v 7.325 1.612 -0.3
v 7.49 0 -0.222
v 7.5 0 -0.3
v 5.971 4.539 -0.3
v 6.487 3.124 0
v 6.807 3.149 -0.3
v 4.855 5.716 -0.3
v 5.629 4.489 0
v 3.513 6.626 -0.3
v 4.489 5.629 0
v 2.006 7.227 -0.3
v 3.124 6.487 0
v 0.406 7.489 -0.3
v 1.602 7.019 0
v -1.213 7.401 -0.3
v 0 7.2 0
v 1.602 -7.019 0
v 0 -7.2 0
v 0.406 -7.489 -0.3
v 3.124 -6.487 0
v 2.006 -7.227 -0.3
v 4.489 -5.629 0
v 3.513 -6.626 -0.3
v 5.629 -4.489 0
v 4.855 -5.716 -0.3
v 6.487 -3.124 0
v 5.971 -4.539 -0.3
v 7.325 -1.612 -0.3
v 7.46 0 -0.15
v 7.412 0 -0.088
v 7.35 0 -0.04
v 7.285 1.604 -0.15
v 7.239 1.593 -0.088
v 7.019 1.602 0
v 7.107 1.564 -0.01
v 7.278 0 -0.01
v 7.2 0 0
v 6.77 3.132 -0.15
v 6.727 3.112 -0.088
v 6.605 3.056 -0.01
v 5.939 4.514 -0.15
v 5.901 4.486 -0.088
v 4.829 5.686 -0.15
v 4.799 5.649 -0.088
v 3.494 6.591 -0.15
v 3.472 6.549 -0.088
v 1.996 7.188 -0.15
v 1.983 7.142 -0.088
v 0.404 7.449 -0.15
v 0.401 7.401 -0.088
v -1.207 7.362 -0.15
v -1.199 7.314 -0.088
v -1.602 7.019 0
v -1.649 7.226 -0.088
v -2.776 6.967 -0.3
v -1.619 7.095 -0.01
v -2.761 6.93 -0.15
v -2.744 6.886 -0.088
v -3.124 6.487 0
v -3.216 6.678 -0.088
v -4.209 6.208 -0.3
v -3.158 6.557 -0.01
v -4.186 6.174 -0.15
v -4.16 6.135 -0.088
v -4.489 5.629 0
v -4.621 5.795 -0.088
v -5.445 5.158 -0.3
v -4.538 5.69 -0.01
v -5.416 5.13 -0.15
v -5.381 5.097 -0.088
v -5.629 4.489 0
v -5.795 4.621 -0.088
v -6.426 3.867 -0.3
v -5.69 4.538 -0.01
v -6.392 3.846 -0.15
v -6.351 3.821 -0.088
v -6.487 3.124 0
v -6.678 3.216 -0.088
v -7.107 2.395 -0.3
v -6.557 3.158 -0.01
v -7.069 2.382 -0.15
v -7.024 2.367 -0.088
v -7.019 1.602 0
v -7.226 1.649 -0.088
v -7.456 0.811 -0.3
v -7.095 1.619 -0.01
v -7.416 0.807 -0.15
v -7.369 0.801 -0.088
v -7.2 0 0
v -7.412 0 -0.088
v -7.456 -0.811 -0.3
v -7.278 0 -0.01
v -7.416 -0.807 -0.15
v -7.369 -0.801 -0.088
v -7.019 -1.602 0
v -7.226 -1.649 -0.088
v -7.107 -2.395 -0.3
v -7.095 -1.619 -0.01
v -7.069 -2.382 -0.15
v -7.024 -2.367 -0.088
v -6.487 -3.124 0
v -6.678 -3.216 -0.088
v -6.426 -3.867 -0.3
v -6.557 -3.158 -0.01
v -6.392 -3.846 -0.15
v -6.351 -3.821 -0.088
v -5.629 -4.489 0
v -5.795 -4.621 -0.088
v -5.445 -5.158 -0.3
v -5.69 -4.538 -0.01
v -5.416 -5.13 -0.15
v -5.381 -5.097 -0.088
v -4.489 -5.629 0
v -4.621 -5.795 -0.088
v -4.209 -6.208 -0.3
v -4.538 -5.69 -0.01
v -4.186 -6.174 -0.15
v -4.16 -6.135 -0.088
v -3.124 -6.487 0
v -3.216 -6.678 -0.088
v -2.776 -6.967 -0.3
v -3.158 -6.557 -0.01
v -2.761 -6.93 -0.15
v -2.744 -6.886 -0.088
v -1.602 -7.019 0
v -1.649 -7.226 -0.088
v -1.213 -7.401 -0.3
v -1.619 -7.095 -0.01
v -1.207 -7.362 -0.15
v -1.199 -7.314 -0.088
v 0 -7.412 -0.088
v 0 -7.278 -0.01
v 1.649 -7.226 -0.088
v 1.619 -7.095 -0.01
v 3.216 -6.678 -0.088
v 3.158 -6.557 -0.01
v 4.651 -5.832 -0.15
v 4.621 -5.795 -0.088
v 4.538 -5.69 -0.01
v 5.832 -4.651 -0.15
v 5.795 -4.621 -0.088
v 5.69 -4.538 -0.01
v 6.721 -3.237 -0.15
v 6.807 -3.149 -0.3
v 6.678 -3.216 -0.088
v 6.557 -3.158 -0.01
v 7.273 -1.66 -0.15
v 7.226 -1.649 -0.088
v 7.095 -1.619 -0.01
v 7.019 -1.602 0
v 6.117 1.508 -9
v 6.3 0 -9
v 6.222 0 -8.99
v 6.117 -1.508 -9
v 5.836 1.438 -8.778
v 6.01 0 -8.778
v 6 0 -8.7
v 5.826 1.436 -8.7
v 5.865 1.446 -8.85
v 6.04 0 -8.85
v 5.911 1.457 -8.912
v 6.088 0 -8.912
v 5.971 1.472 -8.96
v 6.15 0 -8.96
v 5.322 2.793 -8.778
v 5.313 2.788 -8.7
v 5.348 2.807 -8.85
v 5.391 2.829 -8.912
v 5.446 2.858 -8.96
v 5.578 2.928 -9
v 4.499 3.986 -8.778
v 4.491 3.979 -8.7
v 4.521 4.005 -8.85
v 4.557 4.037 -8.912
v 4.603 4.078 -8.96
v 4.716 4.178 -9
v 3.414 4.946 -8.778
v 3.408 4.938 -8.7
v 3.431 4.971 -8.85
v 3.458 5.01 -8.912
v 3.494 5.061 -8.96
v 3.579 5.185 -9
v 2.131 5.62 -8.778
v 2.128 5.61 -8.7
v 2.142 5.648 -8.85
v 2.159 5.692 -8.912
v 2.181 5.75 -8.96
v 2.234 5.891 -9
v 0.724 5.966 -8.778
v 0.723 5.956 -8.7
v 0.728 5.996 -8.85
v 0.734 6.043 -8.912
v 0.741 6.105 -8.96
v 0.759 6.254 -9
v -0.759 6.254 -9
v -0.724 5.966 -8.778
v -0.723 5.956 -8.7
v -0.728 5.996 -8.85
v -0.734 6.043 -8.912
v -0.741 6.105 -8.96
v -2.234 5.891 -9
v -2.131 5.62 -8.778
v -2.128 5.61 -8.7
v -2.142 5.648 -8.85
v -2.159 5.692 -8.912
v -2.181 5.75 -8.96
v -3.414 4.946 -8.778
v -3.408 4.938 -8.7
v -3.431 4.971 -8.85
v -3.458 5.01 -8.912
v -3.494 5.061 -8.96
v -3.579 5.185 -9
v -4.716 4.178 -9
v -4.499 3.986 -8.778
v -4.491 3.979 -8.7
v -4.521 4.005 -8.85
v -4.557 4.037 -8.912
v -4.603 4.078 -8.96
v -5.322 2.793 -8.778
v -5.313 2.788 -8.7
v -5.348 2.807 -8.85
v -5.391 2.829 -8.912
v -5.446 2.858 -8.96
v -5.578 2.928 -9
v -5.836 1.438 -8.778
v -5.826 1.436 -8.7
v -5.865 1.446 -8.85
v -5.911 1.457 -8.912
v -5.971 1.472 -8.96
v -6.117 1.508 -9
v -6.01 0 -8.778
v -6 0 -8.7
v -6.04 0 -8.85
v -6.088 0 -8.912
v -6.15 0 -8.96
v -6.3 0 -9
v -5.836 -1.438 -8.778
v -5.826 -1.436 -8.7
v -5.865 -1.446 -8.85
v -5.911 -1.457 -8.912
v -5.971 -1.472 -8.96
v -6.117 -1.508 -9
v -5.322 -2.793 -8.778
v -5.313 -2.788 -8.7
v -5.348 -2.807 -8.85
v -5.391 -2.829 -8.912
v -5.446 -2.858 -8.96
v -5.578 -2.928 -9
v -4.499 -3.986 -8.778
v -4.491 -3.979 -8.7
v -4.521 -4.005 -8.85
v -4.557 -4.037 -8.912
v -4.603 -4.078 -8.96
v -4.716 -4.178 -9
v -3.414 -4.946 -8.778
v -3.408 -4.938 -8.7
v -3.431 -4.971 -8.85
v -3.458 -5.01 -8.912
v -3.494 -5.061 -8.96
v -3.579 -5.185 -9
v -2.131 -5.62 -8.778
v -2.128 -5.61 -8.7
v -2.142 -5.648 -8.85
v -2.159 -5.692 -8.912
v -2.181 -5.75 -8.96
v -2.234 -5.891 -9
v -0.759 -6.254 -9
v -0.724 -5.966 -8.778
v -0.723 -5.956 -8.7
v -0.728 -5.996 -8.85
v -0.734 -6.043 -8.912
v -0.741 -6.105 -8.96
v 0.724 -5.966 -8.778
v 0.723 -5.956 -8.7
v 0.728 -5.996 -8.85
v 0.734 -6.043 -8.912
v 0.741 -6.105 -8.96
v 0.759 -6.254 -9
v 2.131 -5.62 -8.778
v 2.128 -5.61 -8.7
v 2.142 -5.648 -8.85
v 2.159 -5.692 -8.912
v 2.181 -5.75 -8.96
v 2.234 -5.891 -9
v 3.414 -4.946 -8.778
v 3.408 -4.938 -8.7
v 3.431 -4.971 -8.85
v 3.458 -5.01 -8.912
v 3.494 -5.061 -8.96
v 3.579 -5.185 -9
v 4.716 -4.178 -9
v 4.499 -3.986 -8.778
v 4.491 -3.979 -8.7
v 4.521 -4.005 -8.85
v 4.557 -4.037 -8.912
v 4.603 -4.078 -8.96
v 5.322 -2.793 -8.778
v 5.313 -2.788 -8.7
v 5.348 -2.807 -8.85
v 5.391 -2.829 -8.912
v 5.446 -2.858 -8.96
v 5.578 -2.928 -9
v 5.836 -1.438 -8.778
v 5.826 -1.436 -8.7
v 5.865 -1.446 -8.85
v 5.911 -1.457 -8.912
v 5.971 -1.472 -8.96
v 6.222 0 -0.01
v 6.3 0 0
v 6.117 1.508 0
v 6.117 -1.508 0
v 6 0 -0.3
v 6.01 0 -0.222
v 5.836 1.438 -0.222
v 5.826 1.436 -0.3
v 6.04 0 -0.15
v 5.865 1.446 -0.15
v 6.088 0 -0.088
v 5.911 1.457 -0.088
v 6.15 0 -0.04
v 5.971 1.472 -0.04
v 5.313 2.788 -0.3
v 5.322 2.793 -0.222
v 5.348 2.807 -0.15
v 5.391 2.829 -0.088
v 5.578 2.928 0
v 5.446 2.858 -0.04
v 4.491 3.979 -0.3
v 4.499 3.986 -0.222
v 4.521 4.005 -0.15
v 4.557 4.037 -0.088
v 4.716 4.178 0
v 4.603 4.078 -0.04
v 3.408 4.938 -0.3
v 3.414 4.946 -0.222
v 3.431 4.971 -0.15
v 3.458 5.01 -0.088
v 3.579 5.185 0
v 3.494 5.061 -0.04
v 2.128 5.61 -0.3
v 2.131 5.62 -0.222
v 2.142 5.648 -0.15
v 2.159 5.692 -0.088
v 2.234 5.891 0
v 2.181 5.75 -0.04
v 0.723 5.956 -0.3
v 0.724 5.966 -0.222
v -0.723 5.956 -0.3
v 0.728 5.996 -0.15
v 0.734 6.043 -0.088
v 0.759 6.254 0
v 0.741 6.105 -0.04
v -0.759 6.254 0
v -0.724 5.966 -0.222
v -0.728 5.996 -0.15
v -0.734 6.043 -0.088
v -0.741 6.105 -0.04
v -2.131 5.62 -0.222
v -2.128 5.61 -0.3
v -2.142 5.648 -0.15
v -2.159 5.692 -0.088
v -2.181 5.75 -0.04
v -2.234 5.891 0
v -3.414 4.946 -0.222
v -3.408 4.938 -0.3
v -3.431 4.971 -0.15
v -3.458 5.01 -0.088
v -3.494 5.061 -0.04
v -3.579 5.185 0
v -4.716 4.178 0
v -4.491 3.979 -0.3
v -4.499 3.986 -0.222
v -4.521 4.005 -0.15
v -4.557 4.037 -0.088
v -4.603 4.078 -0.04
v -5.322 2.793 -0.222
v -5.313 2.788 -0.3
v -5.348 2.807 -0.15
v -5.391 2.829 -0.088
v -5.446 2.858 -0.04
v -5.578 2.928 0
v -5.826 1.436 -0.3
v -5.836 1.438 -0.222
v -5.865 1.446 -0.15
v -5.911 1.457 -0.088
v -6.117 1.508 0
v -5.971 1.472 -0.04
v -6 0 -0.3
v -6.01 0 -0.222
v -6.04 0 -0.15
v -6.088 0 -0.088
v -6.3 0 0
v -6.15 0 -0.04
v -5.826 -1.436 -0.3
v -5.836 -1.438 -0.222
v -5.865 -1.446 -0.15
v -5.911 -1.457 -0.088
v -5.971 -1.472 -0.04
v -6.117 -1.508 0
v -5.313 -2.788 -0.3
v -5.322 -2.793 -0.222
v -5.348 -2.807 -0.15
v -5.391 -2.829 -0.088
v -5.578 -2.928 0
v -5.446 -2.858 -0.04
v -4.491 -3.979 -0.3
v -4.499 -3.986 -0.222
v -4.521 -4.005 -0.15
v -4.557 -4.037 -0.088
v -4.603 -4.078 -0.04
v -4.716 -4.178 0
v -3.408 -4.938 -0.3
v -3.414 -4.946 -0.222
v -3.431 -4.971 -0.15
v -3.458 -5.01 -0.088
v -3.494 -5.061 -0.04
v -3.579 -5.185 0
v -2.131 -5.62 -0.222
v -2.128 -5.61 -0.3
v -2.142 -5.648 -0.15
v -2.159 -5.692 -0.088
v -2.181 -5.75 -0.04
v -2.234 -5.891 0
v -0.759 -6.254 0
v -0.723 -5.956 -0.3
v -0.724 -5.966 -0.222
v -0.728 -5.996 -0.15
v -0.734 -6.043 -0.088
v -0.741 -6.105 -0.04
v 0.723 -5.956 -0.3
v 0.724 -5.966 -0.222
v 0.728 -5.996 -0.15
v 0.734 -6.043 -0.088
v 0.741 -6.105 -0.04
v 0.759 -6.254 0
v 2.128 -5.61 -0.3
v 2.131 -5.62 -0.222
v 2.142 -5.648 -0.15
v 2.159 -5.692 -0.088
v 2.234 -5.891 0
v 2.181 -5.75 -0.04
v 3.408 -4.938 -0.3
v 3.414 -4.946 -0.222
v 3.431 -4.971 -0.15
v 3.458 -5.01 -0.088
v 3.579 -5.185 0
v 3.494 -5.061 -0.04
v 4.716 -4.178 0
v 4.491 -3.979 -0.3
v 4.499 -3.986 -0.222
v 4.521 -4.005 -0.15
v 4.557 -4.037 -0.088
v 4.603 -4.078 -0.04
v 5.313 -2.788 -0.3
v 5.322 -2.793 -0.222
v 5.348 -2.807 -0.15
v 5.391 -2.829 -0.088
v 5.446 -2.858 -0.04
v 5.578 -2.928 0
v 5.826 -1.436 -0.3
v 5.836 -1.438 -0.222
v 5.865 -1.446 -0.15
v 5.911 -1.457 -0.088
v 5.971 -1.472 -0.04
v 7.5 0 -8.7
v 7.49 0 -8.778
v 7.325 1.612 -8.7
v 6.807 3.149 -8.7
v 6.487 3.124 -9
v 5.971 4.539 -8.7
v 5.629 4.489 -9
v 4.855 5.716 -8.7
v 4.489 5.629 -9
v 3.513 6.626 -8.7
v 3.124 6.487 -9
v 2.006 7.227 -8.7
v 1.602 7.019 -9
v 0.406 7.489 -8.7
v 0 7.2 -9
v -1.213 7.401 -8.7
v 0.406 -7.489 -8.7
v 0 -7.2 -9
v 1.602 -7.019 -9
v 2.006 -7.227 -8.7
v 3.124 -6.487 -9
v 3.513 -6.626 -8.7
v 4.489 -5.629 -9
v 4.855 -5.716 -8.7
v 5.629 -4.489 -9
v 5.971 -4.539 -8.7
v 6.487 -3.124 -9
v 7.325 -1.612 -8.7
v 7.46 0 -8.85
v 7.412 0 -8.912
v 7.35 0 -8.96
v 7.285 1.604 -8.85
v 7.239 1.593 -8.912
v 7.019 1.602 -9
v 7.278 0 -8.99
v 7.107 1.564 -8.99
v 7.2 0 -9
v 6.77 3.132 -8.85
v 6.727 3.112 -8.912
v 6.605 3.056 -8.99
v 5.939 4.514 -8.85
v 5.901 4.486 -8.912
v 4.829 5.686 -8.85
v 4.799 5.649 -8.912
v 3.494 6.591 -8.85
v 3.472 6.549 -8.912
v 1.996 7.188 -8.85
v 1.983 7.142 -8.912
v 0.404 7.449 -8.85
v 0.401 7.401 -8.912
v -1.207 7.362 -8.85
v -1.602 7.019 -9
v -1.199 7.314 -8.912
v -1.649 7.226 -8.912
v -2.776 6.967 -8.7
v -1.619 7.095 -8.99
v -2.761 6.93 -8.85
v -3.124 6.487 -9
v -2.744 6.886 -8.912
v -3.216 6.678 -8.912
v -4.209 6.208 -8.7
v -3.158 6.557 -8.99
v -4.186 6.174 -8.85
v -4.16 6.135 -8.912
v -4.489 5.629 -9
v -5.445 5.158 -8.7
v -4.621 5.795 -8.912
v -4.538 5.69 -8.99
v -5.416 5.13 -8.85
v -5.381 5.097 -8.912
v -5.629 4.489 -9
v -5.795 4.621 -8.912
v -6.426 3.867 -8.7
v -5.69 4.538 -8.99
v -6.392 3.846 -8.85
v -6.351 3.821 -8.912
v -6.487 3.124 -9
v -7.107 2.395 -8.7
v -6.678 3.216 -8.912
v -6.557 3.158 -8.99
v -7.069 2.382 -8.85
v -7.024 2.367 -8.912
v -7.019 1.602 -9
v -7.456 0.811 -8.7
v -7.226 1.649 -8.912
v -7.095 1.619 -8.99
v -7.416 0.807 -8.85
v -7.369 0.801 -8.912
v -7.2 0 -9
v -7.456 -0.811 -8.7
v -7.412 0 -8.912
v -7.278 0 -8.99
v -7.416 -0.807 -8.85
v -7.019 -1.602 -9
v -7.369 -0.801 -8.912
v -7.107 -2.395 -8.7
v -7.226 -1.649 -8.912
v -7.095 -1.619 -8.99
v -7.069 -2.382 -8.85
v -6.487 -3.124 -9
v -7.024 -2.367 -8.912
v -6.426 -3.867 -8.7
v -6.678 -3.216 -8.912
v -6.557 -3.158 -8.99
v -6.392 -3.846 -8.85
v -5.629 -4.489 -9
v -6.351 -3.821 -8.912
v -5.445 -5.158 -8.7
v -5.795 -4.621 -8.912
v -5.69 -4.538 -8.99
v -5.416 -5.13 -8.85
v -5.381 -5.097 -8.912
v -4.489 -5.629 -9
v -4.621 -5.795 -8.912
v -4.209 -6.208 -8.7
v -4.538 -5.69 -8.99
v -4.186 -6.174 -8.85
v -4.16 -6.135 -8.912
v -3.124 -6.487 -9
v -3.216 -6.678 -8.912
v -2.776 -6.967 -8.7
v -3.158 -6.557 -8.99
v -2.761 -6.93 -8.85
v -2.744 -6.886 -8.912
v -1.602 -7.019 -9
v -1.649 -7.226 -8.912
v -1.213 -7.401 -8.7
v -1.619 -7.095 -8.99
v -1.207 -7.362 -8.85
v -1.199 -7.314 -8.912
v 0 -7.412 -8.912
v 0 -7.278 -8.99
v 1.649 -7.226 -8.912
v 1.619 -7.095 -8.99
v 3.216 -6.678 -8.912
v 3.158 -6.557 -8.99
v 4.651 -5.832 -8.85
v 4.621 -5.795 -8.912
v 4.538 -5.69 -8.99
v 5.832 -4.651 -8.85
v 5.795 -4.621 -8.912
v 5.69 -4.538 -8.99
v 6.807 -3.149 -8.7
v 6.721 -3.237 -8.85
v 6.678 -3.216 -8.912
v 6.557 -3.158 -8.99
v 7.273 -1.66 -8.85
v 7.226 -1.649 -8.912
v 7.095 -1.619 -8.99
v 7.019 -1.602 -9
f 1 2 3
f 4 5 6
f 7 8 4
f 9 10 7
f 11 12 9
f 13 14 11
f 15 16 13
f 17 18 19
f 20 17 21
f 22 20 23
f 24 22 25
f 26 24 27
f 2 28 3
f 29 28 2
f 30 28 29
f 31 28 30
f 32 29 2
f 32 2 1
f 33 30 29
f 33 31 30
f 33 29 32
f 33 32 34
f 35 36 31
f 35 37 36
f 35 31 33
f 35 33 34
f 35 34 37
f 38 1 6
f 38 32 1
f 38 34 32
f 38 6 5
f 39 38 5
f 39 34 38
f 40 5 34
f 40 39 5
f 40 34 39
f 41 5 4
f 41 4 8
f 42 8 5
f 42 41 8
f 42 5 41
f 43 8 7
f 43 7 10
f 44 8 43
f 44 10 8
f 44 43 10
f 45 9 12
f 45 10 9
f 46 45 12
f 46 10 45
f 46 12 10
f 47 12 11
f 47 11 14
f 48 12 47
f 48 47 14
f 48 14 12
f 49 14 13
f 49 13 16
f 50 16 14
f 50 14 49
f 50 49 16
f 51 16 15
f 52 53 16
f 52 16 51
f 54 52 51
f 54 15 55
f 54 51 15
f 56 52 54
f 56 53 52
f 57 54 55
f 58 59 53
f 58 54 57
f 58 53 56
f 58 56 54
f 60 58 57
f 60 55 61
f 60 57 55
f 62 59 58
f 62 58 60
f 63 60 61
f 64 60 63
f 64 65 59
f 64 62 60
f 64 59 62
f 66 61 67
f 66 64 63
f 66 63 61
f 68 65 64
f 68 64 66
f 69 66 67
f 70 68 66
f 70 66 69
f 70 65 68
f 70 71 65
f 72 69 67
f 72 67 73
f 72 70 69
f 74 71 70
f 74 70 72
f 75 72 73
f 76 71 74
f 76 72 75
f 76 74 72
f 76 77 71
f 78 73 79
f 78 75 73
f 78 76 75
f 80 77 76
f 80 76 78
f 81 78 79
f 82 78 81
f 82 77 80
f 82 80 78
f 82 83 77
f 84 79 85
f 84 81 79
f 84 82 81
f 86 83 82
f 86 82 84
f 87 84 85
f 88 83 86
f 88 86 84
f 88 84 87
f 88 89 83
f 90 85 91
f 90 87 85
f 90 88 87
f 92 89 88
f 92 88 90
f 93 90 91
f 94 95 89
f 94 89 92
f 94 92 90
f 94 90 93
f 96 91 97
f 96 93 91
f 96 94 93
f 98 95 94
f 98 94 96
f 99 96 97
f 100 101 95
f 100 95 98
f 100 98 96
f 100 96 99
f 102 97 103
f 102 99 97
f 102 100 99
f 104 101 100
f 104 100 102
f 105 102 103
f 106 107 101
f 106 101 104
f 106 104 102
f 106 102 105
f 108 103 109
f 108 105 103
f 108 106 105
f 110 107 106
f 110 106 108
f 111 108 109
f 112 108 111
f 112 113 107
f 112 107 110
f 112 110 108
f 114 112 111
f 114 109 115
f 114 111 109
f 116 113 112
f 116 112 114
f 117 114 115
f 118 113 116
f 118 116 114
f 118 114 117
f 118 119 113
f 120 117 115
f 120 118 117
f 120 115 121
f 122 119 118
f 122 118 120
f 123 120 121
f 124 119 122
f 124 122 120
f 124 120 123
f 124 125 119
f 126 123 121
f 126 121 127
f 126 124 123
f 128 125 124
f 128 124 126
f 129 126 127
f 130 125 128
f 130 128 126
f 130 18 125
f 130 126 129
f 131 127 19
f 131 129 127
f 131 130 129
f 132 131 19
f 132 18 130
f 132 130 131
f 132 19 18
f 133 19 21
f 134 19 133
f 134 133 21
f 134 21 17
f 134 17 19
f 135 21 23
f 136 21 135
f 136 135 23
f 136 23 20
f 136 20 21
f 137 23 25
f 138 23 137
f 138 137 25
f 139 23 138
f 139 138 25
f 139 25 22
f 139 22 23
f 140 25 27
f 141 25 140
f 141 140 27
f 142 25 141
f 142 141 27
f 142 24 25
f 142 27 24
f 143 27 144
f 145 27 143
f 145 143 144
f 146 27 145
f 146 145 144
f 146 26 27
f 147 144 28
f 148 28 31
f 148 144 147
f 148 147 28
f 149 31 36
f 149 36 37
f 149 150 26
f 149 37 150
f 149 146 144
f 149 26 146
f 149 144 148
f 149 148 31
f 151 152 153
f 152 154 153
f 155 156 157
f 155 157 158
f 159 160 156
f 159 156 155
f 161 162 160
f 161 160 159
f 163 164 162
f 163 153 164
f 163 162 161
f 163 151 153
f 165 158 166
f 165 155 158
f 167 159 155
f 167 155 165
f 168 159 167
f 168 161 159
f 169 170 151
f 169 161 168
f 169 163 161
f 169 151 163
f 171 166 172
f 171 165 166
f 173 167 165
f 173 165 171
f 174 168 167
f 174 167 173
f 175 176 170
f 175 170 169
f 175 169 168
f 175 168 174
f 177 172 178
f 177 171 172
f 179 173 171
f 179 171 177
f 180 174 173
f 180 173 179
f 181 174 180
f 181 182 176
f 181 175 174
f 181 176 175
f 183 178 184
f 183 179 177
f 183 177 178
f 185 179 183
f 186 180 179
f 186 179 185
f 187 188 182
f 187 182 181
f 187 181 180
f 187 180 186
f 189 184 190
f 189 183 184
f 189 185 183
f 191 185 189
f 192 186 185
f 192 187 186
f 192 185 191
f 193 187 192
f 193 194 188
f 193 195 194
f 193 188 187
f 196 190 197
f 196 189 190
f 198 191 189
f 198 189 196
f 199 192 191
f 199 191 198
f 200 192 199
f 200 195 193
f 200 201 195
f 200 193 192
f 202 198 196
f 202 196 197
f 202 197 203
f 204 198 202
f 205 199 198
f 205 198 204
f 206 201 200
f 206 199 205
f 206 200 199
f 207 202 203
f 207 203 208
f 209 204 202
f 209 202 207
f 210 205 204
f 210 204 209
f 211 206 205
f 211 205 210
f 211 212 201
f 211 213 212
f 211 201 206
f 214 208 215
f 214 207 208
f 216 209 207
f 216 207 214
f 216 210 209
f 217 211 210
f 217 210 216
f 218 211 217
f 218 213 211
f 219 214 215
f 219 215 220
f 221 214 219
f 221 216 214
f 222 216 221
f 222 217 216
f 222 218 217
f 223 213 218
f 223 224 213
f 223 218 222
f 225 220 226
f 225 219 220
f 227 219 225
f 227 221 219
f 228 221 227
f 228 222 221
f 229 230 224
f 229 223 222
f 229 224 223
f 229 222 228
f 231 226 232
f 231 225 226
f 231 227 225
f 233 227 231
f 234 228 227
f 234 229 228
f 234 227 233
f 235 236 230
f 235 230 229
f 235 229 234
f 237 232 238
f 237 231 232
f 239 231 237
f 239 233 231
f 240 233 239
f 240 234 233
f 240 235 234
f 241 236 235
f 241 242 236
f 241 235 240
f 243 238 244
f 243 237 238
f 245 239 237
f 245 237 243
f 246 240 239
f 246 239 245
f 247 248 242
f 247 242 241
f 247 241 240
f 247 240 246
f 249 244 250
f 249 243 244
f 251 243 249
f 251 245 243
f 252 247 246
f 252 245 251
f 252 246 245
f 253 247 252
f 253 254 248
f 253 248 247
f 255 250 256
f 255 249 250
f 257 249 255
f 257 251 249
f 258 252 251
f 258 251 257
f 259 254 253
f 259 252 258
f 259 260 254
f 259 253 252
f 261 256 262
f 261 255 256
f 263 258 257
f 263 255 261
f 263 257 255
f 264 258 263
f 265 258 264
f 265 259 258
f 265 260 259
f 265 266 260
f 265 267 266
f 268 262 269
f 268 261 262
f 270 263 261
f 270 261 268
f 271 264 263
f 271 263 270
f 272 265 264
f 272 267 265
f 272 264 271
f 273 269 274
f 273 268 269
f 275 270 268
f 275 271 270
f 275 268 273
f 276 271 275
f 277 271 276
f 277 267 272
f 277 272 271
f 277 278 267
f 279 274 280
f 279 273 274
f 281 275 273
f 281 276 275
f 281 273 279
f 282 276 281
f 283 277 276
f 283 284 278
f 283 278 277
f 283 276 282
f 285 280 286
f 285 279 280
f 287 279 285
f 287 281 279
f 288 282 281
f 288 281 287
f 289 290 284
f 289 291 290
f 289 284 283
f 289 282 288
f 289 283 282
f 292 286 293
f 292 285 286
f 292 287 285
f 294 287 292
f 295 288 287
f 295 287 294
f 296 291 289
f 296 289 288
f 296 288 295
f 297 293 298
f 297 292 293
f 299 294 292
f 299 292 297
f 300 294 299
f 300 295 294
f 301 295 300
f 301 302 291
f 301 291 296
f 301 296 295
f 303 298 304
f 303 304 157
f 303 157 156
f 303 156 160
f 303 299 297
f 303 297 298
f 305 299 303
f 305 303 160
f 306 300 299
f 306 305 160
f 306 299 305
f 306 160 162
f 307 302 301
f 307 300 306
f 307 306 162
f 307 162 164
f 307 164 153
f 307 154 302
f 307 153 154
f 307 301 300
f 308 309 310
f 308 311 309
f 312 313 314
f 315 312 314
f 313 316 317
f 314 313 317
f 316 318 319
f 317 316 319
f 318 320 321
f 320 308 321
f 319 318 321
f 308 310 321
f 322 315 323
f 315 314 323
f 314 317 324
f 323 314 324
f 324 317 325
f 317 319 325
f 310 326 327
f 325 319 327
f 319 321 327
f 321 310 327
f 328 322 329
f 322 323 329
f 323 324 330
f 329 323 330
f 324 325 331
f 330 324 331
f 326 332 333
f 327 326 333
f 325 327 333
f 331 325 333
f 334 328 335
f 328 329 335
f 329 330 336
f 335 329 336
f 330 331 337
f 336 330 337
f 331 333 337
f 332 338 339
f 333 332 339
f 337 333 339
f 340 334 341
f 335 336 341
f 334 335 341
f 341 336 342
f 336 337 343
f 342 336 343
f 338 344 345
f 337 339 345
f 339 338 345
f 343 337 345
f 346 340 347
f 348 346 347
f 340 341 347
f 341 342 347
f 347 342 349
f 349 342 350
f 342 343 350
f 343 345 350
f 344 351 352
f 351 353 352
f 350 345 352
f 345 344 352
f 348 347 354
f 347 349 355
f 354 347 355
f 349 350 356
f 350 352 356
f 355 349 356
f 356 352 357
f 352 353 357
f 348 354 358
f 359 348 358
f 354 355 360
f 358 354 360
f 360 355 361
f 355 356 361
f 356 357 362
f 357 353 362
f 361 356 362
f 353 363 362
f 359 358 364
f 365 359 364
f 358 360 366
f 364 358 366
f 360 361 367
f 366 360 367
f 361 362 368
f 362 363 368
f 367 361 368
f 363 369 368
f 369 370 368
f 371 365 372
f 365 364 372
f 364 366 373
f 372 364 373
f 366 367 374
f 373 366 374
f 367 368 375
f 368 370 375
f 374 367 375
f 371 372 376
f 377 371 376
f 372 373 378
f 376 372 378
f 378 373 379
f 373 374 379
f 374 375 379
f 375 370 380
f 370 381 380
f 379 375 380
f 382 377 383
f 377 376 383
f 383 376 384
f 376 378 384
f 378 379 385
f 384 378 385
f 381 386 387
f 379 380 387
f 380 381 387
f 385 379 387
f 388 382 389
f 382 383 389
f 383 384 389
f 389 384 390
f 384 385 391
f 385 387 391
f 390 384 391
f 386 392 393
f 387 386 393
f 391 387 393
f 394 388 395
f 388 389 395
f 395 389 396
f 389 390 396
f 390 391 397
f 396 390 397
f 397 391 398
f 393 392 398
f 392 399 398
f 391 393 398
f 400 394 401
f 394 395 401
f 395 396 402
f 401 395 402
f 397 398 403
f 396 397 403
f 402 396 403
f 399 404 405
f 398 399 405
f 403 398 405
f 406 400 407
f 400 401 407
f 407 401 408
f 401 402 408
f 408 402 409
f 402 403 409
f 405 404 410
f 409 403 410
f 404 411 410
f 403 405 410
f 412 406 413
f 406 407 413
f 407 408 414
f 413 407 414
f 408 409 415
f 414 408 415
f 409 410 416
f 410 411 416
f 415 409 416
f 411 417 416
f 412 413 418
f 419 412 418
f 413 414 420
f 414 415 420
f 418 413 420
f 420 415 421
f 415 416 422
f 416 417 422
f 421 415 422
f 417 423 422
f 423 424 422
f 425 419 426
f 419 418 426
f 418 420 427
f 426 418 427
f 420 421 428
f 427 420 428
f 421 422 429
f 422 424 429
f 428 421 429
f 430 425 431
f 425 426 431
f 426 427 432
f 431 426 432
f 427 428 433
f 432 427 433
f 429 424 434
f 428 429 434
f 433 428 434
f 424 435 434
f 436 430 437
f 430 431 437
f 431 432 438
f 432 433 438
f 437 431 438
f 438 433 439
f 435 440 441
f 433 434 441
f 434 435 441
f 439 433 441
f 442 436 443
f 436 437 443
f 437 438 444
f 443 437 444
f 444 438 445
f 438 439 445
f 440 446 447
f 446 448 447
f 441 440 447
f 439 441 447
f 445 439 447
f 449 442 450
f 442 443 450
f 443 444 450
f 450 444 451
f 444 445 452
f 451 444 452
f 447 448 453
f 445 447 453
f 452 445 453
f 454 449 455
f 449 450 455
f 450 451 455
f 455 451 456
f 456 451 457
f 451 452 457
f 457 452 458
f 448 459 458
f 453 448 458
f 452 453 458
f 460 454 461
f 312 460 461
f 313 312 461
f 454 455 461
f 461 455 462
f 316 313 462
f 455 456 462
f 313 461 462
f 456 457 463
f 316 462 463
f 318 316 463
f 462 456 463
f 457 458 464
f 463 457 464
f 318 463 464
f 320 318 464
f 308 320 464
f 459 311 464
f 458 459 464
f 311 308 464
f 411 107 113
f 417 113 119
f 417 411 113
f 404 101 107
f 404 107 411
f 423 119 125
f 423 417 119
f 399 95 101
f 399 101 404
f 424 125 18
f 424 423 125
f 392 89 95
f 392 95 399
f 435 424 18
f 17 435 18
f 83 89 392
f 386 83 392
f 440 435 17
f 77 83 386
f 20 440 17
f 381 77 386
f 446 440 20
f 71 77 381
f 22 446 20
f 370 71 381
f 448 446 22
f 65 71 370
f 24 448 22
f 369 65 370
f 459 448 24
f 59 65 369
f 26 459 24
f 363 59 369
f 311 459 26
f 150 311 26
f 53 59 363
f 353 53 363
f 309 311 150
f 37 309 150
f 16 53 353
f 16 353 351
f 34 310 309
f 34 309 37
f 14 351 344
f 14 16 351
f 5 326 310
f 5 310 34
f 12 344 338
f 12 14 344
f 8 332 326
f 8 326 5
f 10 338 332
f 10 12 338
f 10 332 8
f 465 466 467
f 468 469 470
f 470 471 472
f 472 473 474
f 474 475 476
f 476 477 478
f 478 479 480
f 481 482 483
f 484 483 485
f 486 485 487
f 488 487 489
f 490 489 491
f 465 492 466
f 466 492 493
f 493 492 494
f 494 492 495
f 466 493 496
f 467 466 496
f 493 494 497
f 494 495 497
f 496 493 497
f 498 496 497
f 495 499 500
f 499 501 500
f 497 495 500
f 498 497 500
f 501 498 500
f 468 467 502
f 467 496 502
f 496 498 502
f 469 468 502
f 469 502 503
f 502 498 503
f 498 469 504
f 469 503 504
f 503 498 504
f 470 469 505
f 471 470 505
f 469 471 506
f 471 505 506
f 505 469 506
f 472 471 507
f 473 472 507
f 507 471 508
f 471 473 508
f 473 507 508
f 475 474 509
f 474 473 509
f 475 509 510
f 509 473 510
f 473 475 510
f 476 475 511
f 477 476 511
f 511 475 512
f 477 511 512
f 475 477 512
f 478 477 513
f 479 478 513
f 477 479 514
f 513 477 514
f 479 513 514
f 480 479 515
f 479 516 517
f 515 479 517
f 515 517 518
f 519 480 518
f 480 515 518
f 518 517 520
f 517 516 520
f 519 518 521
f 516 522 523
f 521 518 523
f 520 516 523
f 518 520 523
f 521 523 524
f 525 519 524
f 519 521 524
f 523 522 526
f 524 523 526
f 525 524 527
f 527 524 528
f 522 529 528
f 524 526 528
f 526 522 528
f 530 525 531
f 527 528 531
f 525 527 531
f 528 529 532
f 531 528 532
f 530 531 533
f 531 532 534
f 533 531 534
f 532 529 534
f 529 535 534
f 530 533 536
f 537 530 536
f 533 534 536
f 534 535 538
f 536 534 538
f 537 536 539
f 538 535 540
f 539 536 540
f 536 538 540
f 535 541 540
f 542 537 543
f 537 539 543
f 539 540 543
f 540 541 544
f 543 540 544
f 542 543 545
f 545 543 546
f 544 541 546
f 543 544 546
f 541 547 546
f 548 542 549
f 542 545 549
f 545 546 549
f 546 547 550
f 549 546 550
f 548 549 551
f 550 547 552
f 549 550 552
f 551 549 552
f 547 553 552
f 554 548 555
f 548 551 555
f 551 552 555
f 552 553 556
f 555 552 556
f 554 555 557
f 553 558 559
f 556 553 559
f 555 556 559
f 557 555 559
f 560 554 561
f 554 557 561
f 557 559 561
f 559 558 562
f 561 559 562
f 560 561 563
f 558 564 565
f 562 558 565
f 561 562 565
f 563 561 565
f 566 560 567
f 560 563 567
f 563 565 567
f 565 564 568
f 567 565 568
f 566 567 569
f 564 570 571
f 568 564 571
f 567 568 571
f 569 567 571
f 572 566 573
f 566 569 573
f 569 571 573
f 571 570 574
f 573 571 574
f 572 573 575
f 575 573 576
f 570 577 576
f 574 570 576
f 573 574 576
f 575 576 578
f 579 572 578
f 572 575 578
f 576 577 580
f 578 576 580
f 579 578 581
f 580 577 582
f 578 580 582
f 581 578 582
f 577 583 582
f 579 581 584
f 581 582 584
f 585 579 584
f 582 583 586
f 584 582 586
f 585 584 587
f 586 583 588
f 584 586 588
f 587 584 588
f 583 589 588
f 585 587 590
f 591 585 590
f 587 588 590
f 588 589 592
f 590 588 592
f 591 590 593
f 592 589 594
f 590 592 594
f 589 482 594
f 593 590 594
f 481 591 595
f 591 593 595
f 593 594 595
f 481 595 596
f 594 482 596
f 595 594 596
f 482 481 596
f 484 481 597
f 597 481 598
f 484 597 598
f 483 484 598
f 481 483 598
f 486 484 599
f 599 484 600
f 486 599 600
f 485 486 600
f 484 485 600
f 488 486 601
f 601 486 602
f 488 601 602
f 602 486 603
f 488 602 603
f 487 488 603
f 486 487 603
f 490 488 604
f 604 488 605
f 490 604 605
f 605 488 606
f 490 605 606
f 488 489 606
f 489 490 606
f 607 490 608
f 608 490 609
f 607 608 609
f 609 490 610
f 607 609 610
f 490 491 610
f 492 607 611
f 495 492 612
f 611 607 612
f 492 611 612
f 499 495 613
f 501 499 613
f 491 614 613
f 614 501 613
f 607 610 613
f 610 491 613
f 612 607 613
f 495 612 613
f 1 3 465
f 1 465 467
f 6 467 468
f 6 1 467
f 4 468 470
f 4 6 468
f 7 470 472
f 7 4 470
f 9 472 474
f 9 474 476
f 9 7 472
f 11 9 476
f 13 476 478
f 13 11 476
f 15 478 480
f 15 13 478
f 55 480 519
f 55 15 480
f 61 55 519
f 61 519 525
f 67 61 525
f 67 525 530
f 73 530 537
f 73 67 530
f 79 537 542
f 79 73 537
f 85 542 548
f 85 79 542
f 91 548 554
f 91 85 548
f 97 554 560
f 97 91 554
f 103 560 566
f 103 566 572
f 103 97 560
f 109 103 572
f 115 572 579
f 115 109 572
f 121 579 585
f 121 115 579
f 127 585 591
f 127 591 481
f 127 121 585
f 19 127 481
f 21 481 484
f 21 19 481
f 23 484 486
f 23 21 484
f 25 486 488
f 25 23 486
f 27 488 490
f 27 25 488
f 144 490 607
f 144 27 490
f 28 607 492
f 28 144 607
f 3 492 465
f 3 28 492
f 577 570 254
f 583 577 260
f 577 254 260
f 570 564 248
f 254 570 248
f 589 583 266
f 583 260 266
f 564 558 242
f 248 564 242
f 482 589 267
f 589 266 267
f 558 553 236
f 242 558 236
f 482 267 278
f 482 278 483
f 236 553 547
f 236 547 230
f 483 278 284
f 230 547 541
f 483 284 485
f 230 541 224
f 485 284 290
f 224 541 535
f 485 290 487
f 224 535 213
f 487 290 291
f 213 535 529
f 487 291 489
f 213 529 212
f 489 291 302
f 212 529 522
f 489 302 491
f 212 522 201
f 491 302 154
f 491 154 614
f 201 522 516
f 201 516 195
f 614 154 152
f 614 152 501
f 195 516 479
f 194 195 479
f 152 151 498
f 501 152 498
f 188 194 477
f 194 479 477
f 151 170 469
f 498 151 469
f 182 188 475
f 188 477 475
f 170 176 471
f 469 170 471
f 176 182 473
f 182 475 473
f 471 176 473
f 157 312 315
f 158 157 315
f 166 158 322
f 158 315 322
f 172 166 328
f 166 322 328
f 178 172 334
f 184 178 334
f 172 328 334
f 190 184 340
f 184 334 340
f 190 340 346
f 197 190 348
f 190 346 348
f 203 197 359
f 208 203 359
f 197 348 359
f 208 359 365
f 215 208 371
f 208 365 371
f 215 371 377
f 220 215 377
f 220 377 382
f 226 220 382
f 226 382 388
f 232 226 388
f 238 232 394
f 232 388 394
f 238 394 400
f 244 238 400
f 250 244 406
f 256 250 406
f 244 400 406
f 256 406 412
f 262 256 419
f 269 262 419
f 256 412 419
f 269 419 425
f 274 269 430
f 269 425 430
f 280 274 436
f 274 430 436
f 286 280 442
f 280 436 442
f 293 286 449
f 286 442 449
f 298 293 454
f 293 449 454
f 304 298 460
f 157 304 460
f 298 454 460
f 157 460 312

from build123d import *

# Parameters (mm, degrees)
SKETCH1_R           = 7.5
SKETCH1_R_2         = 6
BOSS_EXTRUDE1_DEPTH = 9
FILLET1_R           = 0.3


with BuildPart() as part:
    # Sketch1 → Boss-Extrude1 (new body)
    with BuildSketch(Plane.XY):
        Circle(SKETCH1_R)
        Circle(SKETCH1_R_2, mode=Mode.SUBTRACT)
    extrude(amount=-BOSS_EXTRUDE1_DEPTH)

    # Fillet1
    fillet1_edges = [part.edges().sort_by_distance(p)[0] for p in [
        (-7.5, 0, 0),
        (-7.5, 0, -9),
        (-6, 0, -9),
        (-6, 0, 0),
    ]]
    fillet(fillet1_edges, radius=FILLET1_R)


solid = part.part
